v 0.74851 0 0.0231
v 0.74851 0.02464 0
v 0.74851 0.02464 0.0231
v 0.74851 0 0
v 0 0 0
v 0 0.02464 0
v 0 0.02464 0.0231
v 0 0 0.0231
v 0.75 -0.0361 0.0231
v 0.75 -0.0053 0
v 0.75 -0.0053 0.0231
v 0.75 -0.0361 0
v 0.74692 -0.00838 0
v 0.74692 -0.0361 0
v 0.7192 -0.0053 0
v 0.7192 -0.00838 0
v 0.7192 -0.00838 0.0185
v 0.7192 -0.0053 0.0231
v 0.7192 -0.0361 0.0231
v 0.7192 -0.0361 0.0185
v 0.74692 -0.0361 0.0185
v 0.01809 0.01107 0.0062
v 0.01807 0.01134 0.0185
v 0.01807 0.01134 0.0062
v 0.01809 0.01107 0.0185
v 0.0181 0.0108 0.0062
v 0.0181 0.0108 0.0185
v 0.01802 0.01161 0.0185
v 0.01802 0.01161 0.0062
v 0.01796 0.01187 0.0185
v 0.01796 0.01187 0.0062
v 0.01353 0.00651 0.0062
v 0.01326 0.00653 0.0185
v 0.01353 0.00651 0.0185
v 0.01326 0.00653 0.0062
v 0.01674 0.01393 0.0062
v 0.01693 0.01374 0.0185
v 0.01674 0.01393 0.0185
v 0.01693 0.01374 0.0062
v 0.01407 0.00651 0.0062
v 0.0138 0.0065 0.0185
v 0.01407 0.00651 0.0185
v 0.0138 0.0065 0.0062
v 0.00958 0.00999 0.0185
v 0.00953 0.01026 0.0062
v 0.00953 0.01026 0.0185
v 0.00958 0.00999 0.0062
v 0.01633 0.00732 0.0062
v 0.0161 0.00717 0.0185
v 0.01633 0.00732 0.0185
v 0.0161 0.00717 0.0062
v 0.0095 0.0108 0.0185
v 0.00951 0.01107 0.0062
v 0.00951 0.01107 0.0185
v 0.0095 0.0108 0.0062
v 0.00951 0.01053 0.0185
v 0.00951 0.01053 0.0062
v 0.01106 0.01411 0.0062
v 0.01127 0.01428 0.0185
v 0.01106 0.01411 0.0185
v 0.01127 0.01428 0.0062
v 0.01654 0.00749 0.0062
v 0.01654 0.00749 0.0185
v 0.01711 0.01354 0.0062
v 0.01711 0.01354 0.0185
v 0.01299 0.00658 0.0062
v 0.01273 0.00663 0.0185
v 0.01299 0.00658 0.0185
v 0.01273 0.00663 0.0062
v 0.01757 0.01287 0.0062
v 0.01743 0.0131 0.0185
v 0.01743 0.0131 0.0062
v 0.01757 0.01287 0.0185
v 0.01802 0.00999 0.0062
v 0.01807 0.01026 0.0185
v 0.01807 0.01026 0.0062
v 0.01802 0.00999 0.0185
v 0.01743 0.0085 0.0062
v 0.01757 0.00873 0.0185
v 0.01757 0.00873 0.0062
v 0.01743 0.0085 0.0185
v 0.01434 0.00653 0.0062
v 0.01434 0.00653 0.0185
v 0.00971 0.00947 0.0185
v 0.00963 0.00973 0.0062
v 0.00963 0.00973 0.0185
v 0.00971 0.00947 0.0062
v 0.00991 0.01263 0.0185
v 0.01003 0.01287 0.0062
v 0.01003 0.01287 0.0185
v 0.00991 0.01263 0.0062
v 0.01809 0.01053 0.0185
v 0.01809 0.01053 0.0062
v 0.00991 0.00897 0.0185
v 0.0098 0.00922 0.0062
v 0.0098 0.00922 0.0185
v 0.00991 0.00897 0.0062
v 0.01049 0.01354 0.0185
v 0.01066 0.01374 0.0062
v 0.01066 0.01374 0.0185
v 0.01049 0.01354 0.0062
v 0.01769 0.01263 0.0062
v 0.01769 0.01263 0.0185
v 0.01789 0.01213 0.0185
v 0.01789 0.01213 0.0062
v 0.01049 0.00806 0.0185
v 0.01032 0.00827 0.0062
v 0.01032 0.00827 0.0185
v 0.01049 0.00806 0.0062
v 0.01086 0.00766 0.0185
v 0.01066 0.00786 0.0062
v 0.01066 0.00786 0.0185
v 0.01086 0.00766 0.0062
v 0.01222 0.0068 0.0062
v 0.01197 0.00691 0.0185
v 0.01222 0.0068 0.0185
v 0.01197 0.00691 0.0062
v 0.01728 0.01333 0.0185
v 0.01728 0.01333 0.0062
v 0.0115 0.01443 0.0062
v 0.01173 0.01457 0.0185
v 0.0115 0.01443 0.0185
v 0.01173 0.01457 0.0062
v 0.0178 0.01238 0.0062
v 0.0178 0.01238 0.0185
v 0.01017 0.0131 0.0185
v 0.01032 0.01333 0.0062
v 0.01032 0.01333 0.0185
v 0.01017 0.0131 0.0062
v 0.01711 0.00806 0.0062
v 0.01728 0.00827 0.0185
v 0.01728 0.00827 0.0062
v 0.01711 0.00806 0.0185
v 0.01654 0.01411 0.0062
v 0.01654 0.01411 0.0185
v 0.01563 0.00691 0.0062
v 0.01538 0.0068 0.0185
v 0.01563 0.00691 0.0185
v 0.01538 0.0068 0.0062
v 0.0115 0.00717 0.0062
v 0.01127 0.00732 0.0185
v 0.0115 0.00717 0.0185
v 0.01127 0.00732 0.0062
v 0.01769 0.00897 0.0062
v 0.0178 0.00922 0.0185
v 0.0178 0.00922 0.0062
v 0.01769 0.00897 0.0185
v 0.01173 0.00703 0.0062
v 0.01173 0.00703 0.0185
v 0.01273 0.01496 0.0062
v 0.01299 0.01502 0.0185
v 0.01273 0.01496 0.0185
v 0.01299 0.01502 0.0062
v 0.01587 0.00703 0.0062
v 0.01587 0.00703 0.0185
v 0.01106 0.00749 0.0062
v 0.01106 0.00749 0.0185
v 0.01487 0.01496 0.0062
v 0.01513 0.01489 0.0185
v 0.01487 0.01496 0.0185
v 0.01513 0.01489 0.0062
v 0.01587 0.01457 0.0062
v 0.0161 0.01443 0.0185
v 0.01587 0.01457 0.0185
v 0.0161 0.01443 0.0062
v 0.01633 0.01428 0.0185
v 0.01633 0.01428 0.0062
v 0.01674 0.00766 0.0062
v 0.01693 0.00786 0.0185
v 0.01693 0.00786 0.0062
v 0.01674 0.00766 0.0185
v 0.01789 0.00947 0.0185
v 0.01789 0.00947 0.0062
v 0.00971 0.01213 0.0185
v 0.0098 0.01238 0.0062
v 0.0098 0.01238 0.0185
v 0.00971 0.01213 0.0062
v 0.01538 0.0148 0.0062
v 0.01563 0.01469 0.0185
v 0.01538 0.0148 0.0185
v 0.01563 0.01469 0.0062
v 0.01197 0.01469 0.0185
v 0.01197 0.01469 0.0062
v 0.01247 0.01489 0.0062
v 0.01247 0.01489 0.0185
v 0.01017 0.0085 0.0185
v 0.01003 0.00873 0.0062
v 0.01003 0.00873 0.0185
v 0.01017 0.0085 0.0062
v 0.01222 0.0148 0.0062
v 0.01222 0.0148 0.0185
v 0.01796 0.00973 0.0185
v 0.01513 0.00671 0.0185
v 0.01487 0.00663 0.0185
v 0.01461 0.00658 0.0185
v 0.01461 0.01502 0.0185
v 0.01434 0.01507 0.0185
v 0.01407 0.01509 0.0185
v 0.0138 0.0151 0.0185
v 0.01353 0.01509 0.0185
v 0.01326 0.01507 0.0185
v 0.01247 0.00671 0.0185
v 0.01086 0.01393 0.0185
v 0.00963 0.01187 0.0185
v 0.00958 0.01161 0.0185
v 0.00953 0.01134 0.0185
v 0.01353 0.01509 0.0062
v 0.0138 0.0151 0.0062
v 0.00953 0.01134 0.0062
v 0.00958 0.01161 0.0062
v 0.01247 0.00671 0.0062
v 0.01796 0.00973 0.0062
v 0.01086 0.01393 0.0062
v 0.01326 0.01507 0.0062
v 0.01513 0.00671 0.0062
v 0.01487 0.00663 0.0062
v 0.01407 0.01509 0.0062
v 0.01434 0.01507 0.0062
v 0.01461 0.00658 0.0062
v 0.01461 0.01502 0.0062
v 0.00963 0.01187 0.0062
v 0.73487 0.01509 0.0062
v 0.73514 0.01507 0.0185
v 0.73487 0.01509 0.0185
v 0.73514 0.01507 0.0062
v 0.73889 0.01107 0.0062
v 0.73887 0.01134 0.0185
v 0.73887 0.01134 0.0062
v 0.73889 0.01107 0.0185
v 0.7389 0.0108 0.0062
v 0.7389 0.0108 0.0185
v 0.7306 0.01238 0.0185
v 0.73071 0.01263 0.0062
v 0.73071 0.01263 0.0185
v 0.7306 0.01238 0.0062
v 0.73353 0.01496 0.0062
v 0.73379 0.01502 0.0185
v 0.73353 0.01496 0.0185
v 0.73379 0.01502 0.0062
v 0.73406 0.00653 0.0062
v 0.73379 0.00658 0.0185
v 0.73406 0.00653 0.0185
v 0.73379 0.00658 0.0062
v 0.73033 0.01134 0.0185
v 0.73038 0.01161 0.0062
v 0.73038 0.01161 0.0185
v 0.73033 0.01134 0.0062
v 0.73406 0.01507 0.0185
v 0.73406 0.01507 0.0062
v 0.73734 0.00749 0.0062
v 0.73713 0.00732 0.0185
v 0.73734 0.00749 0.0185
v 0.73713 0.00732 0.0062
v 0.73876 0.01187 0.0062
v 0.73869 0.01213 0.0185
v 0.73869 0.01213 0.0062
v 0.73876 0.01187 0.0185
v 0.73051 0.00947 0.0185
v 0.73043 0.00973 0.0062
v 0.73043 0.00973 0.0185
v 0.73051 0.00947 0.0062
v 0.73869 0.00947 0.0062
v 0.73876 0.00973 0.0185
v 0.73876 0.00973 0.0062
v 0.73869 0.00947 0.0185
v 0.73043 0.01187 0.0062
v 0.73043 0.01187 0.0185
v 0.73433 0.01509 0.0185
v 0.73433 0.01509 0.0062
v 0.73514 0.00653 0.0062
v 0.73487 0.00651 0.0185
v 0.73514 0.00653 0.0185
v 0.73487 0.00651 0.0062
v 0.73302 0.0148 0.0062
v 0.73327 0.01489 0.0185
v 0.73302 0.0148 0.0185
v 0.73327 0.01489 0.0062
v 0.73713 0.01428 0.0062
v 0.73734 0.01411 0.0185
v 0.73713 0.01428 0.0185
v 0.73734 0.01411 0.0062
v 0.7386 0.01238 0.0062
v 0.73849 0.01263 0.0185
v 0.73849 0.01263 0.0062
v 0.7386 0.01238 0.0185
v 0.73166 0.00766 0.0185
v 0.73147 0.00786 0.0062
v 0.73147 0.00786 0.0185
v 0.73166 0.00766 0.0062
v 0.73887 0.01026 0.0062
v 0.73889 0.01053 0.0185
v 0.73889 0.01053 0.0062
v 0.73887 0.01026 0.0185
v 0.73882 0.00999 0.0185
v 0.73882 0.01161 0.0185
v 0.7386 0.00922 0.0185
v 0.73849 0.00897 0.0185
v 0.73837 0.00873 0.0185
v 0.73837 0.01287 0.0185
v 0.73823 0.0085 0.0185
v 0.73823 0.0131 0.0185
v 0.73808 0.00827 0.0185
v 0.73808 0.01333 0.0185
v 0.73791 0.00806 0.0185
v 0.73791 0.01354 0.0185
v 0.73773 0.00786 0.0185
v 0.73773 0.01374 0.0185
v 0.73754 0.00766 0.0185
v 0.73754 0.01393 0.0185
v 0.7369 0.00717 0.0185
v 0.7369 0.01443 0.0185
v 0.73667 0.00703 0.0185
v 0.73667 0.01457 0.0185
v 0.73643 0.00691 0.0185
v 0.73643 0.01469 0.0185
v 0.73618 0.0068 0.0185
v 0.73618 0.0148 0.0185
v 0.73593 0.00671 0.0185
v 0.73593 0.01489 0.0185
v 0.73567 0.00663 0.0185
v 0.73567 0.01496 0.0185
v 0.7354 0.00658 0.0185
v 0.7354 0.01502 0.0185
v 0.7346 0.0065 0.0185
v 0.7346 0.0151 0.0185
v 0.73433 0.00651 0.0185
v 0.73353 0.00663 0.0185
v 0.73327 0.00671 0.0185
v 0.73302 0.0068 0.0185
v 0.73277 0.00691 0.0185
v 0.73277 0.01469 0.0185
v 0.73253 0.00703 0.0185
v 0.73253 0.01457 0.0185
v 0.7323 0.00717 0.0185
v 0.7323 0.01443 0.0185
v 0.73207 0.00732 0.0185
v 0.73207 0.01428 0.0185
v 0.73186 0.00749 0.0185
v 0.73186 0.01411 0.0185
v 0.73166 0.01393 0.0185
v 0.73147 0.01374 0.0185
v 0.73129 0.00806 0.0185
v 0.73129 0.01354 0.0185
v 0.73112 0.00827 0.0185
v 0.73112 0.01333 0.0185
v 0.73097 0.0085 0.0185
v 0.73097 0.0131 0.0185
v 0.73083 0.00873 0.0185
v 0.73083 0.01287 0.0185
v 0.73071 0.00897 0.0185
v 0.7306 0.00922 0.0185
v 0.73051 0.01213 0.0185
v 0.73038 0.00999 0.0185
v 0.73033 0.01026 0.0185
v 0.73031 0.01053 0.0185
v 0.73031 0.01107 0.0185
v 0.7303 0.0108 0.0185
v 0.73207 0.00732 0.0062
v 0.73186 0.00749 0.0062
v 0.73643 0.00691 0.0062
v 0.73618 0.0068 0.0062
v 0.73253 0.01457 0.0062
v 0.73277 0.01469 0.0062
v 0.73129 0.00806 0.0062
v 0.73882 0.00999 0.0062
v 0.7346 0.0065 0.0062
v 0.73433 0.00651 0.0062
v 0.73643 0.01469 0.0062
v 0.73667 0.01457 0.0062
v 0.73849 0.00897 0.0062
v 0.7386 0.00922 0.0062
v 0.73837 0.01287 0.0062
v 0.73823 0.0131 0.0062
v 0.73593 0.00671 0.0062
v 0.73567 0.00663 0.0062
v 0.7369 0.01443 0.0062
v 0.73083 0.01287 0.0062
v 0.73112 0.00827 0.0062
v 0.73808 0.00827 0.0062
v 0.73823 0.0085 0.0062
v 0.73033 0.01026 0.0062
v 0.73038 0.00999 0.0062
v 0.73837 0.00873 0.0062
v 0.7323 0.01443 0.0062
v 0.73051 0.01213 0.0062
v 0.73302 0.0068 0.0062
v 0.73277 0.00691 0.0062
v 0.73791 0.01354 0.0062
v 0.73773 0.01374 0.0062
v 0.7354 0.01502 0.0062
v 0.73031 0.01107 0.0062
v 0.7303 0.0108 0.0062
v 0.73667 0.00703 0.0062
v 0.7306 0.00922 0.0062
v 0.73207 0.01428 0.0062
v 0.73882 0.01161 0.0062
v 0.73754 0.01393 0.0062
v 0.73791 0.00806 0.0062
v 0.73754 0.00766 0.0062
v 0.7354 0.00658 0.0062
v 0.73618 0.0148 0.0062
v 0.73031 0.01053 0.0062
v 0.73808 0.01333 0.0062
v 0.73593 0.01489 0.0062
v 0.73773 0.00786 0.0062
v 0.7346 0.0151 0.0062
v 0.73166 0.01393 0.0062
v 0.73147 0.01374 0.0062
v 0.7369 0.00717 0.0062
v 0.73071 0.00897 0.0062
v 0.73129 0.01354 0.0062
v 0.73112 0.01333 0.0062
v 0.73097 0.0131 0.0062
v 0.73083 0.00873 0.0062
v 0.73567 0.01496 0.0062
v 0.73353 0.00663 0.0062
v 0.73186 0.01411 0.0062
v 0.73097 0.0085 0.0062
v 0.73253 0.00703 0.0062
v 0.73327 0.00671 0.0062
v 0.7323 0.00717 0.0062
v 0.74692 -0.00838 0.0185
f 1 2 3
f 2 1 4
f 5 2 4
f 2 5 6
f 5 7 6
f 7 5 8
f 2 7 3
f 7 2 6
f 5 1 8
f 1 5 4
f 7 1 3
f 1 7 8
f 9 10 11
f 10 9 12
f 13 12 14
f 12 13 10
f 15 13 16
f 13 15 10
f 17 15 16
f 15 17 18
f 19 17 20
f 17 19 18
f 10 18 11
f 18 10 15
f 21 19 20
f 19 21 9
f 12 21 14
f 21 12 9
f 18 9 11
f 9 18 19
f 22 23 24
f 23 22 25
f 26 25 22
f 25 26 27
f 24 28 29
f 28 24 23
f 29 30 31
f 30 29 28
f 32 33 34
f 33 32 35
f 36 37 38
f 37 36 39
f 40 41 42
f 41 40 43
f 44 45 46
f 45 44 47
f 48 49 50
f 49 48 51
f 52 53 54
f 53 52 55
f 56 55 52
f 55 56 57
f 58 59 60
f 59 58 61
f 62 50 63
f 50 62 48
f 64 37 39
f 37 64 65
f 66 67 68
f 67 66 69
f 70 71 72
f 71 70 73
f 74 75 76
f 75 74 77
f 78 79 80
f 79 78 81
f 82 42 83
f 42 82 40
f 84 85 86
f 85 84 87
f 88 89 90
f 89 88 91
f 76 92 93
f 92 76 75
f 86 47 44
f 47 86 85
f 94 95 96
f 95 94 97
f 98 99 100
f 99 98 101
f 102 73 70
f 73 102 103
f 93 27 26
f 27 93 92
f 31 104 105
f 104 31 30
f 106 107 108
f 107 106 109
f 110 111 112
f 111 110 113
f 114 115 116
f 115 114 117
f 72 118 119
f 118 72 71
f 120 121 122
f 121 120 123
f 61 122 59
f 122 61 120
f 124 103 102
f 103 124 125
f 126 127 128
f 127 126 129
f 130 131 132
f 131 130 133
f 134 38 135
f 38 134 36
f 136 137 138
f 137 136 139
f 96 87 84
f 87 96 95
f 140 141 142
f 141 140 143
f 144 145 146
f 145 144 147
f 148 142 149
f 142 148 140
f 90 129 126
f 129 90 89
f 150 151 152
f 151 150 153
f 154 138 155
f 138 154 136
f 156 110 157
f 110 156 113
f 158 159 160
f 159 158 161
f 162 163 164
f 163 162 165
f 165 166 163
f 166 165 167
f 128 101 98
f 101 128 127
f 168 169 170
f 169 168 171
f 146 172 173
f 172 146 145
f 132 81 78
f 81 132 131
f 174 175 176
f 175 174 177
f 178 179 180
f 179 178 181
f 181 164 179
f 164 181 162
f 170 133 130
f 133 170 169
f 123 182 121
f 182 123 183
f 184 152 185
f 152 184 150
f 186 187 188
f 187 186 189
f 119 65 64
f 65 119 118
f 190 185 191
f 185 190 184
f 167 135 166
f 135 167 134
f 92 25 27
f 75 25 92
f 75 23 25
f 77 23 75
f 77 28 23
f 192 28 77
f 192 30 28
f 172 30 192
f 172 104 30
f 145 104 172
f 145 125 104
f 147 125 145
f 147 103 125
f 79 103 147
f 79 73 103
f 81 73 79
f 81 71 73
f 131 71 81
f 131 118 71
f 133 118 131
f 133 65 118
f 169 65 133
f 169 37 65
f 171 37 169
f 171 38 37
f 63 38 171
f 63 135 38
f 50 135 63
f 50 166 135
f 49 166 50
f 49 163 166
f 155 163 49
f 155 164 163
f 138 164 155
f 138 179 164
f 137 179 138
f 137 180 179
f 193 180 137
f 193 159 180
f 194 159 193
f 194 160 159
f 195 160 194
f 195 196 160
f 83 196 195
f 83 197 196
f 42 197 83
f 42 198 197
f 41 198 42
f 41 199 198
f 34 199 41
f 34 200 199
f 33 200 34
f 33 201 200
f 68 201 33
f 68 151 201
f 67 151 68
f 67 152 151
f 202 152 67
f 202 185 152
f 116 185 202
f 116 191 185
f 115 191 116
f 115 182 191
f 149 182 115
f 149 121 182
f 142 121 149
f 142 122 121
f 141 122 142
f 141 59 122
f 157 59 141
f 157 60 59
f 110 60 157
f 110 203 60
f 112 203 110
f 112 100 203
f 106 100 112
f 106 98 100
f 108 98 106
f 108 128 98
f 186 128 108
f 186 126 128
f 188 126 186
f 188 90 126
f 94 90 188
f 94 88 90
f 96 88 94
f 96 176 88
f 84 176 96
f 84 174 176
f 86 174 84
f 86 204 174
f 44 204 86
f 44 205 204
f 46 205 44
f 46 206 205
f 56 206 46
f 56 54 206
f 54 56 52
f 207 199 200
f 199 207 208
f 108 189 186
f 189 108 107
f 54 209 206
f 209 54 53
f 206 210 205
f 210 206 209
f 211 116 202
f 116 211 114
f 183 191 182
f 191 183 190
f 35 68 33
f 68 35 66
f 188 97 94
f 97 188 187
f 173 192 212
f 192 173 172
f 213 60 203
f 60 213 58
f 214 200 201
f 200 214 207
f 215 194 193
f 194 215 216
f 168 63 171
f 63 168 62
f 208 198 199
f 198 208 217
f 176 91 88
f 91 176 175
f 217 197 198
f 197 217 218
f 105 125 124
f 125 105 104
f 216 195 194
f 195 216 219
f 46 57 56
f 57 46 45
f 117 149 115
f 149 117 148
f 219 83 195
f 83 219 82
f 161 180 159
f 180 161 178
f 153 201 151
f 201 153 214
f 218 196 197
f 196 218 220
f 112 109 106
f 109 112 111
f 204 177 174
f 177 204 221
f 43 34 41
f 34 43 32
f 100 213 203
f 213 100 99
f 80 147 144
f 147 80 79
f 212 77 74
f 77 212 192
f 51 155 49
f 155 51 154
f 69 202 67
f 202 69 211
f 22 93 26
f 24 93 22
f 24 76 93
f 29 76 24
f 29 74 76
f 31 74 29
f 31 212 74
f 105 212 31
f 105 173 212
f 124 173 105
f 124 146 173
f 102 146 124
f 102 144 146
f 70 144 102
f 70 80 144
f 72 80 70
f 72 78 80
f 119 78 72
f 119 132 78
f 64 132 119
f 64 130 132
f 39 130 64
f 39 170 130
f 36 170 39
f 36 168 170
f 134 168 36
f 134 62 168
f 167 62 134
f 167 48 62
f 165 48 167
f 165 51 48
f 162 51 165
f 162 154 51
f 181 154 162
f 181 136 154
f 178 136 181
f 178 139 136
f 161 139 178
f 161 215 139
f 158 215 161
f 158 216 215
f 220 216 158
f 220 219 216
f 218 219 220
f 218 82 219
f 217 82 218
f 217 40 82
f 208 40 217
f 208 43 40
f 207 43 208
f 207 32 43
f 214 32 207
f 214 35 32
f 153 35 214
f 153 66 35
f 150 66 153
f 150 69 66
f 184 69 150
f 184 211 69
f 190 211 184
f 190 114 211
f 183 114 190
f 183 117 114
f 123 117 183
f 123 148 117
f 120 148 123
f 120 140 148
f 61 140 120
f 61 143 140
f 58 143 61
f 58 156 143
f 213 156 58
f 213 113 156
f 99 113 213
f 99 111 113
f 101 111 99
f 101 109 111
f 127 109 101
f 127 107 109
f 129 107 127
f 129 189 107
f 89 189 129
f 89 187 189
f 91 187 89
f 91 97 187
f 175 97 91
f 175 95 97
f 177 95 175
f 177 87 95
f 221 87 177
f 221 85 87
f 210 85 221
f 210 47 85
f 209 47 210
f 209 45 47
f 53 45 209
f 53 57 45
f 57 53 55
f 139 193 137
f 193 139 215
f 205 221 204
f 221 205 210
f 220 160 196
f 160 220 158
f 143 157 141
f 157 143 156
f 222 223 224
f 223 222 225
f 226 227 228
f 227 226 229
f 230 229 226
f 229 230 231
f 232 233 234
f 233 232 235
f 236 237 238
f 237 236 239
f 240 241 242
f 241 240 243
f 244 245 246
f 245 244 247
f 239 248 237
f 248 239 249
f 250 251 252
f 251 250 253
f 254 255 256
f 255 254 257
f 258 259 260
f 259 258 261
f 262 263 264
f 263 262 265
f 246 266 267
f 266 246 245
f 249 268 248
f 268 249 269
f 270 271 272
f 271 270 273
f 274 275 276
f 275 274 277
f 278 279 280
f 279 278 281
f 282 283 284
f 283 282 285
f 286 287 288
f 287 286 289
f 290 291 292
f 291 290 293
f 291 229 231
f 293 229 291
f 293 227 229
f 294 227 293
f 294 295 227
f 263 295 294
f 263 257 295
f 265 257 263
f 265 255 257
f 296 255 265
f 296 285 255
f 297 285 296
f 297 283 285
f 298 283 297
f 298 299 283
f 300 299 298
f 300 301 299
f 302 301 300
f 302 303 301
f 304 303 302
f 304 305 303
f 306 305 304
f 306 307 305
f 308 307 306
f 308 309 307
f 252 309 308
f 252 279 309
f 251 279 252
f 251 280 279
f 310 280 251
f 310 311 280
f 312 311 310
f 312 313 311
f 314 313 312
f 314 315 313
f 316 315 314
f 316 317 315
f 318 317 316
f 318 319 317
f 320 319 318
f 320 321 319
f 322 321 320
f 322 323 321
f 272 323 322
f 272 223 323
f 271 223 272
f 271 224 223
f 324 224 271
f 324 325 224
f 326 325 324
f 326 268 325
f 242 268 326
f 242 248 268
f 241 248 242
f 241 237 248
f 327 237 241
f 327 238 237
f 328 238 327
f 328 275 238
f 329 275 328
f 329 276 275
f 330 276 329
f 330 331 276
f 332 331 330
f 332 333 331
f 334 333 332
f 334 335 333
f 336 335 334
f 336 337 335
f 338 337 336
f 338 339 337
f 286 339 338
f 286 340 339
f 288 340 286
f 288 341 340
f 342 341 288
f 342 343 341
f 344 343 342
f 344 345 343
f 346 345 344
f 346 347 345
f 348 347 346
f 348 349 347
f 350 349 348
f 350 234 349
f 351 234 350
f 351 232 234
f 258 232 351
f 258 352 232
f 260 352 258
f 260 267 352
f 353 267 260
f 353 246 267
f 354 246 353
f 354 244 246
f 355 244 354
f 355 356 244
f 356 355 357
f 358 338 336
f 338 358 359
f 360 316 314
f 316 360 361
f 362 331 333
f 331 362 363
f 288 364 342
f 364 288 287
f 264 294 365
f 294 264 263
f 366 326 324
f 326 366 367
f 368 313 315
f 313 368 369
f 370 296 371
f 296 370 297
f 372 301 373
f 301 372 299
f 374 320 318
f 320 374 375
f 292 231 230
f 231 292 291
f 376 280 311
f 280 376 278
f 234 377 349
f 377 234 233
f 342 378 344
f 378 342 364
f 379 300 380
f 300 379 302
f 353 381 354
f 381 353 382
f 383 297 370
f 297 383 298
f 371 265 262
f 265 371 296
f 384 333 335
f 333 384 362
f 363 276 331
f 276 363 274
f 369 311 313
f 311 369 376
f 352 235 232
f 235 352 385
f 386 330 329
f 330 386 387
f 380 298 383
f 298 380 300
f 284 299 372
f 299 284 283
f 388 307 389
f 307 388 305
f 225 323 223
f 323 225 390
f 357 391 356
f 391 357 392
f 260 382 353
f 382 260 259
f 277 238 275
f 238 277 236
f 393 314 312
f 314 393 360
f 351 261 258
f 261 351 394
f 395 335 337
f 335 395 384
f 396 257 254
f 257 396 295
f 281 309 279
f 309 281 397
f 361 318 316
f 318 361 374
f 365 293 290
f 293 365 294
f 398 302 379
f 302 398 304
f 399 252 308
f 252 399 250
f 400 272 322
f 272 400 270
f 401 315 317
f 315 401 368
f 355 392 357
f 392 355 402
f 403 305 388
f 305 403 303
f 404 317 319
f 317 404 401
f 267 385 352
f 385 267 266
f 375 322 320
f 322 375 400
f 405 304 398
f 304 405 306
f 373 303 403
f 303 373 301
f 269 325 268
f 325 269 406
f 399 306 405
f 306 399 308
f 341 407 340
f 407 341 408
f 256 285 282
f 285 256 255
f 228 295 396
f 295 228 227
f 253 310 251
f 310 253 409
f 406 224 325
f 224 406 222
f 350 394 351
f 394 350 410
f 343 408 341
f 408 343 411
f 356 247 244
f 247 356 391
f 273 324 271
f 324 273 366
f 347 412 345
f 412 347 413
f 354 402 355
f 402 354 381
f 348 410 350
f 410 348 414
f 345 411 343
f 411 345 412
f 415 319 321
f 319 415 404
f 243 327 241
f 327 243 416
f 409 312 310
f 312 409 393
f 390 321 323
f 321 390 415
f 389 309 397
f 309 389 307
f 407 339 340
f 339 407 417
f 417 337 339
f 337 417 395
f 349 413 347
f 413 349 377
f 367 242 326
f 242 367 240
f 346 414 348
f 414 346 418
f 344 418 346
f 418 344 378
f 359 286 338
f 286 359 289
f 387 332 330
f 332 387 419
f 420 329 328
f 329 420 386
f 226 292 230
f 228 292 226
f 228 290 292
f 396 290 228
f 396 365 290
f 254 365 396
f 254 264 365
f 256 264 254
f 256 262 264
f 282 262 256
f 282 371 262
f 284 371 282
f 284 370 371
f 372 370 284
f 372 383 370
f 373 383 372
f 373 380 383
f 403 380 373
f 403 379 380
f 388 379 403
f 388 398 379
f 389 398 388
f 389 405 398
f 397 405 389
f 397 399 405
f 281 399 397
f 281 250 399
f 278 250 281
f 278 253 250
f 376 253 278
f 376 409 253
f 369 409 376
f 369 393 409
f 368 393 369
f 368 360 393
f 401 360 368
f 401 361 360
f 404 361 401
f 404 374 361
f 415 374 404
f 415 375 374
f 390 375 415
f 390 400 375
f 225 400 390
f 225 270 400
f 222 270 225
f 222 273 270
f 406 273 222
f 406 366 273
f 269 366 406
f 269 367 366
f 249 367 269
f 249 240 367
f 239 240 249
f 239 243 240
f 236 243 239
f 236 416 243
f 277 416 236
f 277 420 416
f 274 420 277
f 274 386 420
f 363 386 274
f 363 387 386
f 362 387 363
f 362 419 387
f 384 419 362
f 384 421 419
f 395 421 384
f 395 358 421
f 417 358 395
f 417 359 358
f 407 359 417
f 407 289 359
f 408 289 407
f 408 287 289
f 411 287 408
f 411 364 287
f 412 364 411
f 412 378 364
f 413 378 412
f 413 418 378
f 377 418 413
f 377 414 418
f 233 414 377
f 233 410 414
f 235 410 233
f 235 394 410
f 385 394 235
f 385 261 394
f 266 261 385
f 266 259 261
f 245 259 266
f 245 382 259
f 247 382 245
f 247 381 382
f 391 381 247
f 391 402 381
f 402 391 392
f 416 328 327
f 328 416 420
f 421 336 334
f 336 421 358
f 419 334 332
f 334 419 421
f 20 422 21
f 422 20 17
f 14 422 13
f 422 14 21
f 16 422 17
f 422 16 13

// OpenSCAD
// ============================================
// Rail with End Block - Parametric CAD Model
// ============================================
// All dimensions in millimeters

// --- Main Rail Dimensions ---
rail_length    = 0.748506;   // Total rail length (x-axis)
rail_width     = 0.024642;   // Rail width (y-axis)
rail_height    = 0.018482;   // Lower body nominal height
rail_depth     = 0.0185;     // Lower body extrusion depth (z)

// --- Upper Layer (shared by rail and end block) ---
upper_thick    = 0.00462;    // Layer nominal thickness
upper_depth    = 0.0046;     // Layer extrusion depth (z)
upper_z_top    = 0.0231;     // Upper surface z from base datum

// --- Circular Recesses in Rail ---
recess_r       = 0.0043;     // Recess radius
recess_y_off   = 0.0108;     // Y-offset from rail front edge
recess1_x      = 0.0138;     // 1st recess center x from rail left
recess2_x      = 0.7346;     // 2nd recess center x from rail left
recess_z_bot   = 0.0062;     // Recess band bottom z
recess_z_top   = 0.0185;     // Recess band top z
recess_depth   = 0.0123;     // Recess cut depth (z_top - z_bot)

// --- End Block ---
end_size       = 0.030803;   // Equal-sided block dimension
end_x          = 0.7192;     // Left edge x from rail left end
end_y          = -0.0361;    // Front edge y (extends in front of rail)

// --- End Block Circular Recess ---
end_circ_x     = 0.7361;     // Center x from rail left end
end_circ_y     = -0.0192;    // Center y (in front of rail front edge)

// --- Rectangular Cutout in End Block ---
cutout_size    = 0.027722;   // Equal-sided cutout dimension
cutout_z_top   = 0.0185;     // Top at lower-body shoulder
cutout_z_bot   = -0.0585;    // Bottom below base datum
cutout_height  = 0.077;      // Total reach from shoulder to bottom

// --- Resolution ---
$fn = 100;

// ============================================
// Model Construction
// ============================================

difference() {
    // === Solid Bodies ===
    union() {
        // Rail lower body (base extrusion from datum)
        cube([rail_length, rail_width, rail_depth]);

        // Rail upper layer (raises surface to 0.0231)
        translate([0, 0, rail_depth])
            cube([rail_length, rail_width, upper_depth]);

        // End block lower body
        translate([end_x, end_y, 0])
            cube([end_size, end_size, rail_depth]);

        // End block upper layer
        translate([end_x, end_y, rail_depth])
            cube([end_size, end_size, upper_depth]);
    }

    // === Subtractive Features ===

    // Rail circular recess 1 (near left end)
    translate([recess1_x, recess_y_off, recess_z_bot])
        cylinder(h = recess_depth, r = recess_r);

    // Rail circular recess 2 (near right end)
    translate([recess2_x, recess_y_off, recess_z_bot])
        cylinder(h = recess_depth, r = recess_r);

    // End block circular recess
    translate([end_circ_x, end_circ_y, recess_z_bot])
        cylinder(h = recess_depth, r = recess_r);

    // Rectangular cutout in end block (deep pocket through lower body)
    translate([end_x, end_y, cutout_z_bot])
        cube([cutout_size, cutout_size, cutout_height]);
}
